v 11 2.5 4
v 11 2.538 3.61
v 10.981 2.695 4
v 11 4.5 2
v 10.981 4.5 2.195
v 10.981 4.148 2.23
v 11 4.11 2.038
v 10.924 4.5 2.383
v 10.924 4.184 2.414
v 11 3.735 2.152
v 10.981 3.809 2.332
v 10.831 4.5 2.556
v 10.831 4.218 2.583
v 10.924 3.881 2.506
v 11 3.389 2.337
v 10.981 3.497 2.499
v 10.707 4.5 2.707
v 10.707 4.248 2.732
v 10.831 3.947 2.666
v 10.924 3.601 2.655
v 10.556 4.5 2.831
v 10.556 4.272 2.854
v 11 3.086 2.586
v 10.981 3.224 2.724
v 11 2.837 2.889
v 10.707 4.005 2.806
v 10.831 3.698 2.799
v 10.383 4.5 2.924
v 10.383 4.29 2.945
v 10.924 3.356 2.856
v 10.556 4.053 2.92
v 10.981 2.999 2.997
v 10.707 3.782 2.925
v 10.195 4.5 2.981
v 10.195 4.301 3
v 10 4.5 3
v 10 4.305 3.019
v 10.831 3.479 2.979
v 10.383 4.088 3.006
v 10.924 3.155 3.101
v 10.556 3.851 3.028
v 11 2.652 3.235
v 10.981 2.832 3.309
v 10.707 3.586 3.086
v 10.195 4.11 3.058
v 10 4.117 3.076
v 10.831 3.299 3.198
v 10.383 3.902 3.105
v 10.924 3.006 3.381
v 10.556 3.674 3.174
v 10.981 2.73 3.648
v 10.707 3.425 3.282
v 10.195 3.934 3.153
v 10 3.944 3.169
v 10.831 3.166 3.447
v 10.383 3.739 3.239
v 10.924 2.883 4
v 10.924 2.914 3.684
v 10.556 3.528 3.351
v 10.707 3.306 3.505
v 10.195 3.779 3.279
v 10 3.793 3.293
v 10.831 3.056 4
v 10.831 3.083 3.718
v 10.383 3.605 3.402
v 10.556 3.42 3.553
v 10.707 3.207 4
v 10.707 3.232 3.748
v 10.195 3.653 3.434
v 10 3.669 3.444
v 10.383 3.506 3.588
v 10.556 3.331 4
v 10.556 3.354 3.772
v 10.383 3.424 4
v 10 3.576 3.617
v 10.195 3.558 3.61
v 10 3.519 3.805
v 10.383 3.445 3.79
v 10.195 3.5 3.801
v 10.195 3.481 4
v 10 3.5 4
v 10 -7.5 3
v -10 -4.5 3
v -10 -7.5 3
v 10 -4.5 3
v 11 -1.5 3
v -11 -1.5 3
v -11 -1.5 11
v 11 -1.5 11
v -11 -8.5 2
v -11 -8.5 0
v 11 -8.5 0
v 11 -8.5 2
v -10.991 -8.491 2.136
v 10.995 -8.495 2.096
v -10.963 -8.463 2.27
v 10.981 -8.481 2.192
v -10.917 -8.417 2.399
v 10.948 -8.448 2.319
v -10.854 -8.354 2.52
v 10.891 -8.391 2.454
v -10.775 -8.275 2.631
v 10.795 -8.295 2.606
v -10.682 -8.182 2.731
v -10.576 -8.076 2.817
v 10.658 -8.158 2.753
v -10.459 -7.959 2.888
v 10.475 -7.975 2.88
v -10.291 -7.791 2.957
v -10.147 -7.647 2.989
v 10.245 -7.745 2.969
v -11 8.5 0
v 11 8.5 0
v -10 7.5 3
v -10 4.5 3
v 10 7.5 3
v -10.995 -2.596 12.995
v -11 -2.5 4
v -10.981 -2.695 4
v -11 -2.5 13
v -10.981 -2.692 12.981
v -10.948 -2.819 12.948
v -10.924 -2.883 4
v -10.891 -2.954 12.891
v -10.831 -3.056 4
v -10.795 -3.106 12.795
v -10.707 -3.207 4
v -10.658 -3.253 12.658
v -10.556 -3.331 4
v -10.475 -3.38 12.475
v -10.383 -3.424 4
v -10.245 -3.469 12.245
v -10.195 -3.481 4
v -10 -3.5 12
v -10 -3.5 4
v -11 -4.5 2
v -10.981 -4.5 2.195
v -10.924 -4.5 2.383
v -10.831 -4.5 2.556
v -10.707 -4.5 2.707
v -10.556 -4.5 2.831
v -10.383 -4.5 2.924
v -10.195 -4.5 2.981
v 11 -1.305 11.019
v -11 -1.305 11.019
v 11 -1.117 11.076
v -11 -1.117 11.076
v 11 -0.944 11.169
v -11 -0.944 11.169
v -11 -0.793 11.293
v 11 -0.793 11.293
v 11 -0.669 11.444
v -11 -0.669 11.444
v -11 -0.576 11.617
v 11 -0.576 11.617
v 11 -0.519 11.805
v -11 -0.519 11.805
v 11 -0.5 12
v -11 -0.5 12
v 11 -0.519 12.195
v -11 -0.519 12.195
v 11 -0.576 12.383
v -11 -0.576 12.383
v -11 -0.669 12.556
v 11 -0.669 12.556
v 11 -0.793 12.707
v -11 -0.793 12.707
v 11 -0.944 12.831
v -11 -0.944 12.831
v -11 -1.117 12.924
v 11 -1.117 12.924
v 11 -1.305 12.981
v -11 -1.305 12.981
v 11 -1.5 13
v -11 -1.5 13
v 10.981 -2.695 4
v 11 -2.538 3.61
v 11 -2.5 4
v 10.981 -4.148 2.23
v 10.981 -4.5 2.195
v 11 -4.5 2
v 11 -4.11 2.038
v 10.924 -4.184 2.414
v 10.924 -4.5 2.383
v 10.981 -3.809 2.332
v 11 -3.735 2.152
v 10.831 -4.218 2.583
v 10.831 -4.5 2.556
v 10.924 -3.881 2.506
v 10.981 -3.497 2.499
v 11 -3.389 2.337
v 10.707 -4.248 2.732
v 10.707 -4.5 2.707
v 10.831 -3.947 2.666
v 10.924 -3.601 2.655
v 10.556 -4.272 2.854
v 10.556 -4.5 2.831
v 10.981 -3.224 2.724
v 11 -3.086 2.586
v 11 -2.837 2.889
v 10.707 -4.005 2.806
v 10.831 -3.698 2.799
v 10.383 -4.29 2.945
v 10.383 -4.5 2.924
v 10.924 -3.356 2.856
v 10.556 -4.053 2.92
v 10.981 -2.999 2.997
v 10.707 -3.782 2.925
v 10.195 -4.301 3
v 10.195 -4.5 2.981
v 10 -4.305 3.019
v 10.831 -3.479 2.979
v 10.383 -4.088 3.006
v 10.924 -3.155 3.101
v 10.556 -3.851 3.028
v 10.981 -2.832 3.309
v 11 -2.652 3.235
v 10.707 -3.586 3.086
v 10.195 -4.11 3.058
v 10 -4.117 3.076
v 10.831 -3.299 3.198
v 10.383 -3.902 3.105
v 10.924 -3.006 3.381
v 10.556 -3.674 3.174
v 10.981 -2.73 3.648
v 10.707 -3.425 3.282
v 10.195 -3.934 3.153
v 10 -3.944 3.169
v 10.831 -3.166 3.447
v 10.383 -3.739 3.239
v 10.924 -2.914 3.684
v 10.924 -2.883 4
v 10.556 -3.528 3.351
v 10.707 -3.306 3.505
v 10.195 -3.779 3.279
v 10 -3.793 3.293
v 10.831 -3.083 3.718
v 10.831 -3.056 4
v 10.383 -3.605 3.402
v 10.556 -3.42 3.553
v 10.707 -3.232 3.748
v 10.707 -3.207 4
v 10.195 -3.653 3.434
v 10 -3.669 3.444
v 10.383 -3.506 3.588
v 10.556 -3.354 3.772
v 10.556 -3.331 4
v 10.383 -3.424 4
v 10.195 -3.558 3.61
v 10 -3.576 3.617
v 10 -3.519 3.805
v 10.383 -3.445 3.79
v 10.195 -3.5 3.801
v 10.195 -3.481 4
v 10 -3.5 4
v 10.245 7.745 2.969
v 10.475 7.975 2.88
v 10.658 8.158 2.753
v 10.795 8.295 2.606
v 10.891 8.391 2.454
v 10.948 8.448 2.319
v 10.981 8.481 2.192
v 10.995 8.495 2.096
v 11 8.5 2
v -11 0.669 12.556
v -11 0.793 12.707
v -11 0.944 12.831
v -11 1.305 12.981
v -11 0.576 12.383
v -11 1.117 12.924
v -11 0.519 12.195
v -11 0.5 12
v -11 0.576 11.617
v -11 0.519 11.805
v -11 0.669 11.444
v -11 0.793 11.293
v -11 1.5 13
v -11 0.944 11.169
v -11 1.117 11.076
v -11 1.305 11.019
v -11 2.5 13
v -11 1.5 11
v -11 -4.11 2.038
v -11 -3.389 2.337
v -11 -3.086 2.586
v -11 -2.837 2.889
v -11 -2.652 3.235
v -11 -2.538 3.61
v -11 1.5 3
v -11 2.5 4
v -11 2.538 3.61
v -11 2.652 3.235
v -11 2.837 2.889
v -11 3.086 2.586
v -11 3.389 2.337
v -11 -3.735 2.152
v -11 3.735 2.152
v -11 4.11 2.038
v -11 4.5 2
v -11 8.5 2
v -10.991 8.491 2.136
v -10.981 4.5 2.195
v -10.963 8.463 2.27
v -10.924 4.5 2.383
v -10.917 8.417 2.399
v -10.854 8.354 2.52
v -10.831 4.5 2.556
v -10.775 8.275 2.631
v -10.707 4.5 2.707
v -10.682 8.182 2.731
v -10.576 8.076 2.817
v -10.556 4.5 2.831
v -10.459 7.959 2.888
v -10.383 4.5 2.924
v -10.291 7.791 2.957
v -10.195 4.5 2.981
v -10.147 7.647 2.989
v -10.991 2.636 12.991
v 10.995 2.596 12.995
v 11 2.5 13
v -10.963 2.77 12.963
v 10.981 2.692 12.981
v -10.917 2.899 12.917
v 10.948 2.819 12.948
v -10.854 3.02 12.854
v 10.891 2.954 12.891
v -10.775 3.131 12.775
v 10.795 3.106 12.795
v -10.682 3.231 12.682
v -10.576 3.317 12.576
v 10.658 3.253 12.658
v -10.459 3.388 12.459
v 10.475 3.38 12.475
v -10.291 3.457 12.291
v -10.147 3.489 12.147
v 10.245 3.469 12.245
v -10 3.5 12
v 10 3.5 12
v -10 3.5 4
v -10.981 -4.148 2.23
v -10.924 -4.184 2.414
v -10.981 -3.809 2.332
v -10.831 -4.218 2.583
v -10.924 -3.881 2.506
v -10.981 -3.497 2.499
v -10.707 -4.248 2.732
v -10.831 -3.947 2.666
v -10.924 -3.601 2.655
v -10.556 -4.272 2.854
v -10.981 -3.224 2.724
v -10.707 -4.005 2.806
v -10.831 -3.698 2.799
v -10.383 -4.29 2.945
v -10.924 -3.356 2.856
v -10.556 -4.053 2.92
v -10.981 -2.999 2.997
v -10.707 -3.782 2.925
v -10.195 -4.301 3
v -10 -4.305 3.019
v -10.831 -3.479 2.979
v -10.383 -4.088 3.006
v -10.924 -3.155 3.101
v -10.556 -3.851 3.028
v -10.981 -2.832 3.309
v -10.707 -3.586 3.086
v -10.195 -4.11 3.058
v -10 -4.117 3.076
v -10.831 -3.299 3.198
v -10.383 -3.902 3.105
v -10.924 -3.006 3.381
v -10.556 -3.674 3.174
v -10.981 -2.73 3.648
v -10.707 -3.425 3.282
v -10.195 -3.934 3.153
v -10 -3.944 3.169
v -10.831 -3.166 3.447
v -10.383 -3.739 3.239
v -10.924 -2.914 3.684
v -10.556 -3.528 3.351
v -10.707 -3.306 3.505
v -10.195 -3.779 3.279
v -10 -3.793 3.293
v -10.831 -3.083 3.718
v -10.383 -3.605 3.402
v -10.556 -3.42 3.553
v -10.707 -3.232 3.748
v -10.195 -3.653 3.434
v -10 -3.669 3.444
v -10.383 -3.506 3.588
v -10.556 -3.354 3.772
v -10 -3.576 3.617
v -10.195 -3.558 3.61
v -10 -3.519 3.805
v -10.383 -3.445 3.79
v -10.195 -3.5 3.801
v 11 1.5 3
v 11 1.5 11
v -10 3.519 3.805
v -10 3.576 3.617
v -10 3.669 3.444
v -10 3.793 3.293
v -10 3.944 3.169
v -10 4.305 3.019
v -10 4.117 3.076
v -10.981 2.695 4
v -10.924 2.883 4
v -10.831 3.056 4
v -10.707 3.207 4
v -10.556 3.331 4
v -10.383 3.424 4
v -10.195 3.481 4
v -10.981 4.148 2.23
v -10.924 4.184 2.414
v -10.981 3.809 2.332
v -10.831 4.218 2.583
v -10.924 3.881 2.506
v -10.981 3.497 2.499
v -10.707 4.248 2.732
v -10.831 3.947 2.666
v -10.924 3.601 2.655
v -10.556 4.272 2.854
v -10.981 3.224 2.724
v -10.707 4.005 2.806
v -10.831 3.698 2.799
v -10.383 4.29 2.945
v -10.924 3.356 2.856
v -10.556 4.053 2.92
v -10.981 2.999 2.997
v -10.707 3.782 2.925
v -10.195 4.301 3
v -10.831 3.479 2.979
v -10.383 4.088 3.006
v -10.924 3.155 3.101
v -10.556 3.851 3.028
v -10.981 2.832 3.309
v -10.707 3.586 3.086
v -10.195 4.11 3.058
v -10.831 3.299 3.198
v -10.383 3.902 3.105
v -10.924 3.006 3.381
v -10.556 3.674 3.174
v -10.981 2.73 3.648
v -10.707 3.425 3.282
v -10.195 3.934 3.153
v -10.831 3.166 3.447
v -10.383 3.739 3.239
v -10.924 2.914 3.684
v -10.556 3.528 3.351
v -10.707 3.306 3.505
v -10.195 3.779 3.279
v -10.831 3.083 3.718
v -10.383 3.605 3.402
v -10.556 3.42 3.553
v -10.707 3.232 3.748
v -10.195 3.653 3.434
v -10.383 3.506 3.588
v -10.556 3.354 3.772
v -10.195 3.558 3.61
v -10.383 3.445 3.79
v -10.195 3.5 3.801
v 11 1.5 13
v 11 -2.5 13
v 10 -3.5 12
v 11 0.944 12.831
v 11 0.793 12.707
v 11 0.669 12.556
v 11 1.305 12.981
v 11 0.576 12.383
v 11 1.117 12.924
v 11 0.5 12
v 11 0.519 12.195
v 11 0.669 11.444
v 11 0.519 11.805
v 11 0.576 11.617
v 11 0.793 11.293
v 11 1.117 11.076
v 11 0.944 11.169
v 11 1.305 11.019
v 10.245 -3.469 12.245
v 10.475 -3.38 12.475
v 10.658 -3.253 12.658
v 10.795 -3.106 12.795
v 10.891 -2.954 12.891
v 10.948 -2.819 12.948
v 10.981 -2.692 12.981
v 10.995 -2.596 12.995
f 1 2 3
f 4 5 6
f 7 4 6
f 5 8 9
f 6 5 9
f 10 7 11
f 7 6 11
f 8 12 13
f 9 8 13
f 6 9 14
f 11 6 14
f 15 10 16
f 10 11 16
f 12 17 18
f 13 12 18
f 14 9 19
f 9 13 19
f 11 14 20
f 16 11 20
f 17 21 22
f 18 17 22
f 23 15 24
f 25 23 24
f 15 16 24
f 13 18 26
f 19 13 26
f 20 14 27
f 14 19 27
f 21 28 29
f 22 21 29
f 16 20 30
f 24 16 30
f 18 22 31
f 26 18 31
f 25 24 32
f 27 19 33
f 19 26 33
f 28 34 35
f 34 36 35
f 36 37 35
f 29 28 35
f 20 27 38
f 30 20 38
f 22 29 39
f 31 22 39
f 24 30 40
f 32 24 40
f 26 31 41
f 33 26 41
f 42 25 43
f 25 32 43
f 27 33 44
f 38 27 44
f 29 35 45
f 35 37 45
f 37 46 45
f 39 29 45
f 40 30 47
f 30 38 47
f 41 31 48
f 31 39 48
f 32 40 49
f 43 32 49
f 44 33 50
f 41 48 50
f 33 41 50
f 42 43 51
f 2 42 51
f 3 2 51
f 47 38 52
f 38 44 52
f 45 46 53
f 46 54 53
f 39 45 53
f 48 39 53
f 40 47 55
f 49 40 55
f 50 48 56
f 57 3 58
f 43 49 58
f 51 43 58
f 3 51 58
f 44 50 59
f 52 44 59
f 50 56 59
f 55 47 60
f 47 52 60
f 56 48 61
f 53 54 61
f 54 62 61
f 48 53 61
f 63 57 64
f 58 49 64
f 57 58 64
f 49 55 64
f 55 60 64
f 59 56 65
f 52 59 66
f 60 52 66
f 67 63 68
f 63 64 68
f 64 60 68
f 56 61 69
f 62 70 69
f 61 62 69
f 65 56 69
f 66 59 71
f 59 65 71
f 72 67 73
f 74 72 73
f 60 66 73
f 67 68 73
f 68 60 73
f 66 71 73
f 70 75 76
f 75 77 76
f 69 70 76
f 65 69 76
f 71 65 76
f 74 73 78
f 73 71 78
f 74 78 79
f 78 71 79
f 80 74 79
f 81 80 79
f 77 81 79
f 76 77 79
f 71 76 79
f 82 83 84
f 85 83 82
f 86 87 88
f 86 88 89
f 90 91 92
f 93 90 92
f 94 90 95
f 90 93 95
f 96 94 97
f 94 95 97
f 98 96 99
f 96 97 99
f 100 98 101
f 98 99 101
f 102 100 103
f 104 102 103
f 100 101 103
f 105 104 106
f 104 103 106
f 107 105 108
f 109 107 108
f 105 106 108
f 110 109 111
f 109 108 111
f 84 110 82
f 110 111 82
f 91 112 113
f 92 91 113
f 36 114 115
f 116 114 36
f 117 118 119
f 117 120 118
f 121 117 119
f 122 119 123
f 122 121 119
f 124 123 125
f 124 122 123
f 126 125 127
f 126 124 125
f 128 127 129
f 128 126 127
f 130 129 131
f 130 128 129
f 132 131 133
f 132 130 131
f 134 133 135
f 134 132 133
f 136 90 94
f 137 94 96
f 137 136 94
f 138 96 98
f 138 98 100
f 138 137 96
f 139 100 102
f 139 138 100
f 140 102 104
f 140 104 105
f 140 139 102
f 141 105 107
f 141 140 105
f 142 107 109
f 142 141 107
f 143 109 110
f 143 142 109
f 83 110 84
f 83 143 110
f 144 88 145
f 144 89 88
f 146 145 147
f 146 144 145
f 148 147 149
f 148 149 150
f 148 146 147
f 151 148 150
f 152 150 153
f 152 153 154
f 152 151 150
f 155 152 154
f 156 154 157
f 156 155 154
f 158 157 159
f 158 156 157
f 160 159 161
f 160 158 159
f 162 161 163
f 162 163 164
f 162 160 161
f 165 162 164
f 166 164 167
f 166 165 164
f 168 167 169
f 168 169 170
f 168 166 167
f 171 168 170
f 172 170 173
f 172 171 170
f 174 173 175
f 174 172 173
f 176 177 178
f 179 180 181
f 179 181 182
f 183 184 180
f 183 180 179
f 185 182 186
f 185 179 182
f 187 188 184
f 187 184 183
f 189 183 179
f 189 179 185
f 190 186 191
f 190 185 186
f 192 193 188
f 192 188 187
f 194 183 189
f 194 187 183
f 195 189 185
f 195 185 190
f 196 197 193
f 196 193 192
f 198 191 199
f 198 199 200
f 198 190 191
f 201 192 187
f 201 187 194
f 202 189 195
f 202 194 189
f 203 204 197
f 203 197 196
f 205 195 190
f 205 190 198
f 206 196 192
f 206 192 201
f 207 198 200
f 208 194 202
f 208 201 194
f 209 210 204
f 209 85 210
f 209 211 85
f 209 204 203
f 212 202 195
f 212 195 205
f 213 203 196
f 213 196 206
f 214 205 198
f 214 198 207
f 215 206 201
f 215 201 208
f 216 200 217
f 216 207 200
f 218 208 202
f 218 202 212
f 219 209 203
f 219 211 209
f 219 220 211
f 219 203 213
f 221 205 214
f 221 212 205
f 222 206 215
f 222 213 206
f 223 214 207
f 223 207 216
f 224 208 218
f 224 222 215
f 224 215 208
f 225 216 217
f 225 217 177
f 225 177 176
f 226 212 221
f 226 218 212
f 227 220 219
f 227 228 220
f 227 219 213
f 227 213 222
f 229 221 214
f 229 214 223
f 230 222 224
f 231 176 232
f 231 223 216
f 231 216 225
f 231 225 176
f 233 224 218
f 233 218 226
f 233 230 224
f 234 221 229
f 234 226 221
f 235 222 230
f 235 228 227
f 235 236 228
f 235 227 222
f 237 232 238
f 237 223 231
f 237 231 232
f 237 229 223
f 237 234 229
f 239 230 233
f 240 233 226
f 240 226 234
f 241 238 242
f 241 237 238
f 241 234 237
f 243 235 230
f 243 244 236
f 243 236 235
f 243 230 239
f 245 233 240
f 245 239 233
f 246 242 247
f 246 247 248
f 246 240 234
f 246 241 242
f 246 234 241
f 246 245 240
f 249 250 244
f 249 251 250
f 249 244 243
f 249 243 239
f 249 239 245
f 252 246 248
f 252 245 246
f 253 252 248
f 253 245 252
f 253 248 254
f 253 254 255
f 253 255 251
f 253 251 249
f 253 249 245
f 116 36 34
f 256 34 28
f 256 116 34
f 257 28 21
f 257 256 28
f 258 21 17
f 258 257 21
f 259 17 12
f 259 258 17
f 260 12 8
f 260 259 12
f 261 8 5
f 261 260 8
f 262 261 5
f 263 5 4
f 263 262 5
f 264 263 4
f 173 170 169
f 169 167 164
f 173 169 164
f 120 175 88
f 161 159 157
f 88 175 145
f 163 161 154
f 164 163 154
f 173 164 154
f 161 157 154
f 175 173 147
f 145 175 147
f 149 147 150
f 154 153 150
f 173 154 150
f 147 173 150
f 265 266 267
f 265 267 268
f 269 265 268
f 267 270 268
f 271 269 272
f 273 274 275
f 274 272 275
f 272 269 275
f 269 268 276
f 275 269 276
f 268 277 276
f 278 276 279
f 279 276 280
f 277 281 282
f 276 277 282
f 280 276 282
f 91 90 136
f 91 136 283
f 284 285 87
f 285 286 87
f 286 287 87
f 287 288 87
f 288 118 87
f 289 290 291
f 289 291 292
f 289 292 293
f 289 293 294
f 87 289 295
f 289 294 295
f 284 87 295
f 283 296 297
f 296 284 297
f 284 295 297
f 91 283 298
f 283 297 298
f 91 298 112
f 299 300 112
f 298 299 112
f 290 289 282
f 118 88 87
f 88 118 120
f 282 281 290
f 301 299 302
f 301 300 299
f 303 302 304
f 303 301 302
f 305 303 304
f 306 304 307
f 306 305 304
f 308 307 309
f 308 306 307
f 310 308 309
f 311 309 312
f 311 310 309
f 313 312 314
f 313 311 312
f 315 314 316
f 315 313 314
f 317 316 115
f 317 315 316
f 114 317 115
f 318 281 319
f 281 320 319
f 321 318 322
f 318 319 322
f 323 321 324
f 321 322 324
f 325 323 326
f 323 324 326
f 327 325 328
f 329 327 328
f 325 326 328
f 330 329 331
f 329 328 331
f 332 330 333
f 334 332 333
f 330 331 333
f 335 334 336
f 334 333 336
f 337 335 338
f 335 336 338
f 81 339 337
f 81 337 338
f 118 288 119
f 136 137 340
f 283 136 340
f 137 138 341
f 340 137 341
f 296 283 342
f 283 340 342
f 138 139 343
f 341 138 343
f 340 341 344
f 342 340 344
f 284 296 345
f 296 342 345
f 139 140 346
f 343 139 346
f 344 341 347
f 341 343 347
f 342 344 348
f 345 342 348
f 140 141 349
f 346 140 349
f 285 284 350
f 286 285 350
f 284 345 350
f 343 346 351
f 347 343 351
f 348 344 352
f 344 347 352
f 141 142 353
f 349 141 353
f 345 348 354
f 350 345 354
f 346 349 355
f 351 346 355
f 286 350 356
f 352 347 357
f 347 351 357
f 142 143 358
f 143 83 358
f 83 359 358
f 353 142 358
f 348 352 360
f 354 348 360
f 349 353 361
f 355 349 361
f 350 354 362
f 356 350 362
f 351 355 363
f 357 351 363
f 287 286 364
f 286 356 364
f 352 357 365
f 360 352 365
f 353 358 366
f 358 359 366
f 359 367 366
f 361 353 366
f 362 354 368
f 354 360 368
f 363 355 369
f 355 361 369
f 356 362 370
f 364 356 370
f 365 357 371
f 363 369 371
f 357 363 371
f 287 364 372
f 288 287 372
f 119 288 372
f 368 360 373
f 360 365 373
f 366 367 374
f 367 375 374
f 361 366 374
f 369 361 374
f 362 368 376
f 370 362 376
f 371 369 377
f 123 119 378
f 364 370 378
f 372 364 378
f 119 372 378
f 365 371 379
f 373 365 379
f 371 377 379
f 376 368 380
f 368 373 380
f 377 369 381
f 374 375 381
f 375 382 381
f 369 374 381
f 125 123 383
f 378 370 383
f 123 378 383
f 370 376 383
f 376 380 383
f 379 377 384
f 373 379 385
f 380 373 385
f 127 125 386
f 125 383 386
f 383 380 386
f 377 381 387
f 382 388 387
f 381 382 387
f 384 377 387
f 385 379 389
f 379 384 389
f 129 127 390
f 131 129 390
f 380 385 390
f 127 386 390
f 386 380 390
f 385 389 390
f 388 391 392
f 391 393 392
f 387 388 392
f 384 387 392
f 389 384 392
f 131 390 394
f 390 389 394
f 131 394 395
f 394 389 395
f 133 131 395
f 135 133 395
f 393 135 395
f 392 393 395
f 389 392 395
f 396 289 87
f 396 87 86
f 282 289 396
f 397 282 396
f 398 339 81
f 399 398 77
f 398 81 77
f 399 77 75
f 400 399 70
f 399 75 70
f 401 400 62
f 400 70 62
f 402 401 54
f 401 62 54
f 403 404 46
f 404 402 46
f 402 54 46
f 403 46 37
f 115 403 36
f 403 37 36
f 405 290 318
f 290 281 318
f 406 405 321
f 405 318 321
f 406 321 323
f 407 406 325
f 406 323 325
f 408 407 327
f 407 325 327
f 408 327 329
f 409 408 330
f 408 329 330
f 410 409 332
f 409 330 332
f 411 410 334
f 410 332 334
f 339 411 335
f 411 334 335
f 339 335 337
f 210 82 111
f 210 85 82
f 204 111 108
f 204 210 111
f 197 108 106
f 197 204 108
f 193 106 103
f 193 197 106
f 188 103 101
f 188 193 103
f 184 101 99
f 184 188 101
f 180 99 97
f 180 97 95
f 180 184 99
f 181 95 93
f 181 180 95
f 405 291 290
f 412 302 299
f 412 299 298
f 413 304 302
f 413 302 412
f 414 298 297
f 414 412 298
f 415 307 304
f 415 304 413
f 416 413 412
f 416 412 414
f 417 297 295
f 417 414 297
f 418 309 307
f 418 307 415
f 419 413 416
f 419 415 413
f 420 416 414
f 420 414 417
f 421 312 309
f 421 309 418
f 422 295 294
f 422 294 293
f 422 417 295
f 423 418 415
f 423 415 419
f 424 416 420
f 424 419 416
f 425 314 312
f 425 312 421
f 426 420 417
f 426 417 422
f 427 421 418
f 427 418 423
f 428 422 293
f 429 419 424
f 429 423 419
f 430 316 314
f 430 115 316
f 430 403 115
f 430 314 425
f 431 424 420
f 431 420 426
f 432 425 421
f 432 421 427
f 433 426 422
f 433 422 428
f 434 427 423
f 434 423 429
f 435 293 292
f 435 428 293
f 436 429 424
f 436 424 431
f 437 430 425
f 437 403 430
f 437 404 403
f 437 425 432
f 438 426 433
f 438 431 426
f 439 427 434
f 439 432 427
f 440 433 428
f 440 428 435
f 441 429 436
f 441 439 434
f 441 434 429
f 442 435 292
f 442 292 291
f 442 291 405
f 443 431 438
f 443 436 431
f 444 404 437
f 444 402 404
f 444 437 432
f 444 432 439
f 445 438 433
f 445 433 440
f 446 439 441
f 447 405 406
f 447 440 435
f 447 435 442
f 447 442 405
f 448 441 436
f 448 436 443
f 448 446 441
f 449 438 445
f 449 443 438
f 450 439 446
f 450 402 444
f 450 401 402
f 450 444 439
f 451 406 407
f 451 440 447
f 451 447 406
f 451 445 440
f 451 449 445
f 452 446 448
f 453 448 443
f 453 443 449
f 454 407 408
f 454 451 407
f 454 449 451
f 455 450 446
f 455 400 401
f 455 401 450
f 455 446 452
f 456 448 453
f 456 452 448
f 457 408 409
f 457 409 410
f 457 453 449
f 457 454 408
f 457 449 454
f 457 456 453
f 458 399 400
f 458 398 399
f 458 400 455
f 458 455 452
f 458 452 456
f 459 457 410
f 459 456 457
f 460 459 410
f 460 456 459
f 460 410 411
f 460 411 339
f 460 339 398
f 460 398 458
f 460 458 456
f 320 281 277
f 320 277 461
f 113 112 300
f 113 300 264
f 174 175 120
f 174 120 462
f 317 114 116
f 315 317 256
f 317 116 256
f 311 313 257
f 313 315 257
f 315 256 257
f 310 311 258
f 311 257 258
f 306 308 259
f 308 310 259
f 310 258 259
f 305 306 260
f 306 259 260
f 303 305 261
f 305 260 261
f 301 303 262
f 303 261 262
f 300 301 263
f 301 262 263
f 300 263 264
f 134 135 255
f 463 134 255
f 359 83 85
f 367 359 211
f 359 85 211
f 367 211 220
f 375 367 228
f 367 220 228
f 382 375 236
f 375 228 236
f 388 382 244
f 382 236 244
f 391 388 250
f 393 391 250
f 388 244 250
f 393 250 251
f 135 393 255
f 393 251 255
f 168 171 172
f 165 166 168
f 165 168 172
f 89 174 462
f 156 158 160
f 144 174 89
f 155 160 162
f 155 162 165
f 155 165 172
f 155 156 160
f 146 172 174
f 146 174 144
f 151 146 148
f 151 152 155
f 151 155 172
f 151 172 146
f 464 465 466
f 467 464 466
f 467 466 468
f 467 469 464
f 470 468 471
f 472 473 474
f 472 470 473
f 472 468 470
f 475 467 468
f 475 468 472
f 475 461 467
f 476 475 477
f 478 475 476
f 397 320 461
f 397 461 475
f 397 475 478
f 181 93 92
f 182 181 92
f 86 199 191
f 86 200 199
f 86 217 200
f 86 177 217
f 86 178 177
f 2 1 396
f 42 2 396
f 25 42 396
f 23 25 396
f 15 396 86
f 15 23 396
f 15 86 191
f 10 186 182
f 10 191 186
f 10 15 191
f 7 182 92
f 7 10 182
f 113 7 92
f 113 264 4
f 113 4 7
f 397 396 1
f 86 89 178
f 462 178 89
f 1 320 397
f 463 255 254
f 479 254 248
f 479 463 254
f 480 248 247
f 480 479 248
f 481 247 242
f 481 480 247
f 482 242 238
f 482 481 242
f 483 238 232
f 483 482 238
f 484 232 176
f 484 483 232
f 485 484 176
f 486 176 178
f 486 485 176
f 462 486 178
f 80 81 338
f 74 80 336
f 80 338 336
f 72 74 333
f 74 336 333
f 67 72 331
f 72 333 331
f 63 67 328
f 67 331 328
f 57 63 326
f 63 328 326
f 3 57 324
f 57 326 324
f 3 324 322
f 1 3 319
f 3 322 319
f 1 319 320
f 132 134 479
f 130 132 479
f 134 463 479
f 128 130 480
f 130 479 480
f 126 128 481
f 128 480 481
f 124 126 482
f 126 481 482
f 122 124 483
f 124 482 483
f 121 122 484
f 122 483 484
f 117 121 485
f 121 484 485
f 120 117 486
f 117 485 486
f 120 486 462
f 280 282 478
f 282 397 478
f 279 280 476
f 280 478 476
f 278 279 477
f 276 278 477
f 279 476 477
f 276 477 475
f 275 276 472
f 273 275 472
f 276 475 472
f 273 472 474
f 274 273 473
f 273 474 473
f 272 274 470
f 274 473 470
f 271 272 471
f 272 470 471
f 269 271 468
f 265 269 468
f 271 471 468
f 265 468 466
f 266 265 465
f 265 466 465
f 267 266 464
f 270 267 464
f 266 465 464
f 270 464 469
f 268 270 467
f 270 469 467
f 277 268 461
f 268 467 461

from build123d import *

# Parameters (mm, degrees)
F0_W     = 22
F0_H     = 17
F1_DEPTH = 3
F2_W     = 22
F2_H     = 2
F3_DEPTH = 10
F4_W     = 22
F4_H     = 1
F7_R     = 1


with BuildPart() as f1:
    # F0 (on Top) → F1 (new body)
    with BuildSketch(Plane.XY):
        Rectangle(F0_W, F0_H)
    extrude(amount=F1_DEPTH)

    # F2 (on face) → F3 (join)
    with BuildSketch(Plane.XY.offset(3)):
        with Locations((0, 2.5)):
            Rectangle(F2_W, F2_H)
        with Locations((0, -2.5)):
            Rectangle(F2_W, F2_H)
    extrude(amount=F3_DEPTH)

    # F4 (on face) → F5 (revolve)
    with BuildSketch(Plane.XZ.offset(-1.5)):
        with Locations((0, 12.5)):
            Rectangle(F4_W, F4_H)
    revolve(axis=Axis((0, 1.5, 12), (-1, 0, 0)))

    # F6: F1 across plane


with BuildPart() as f1_1:
    add(f1.part)
    add(f1.part.mirror(Plane.XZ))

    # F7
    f7_edges = [f1_1.edges().sort_by_distance(p)[0] for p in [
        (0, -3.5, 3),
        (0, -3.5, 13),
        (11, 3.5, 8),
        (11, -6, 3),
        (0, -8.5, 3),
        (-11, -6, 3),
        (0, 3.5, 13),
        (0, 3.5, 3),
        (-11, 6, 3),
        (11, 6, 3),
        (0, 8.5, 3),
        (-11, 3.5, 8),
        (-11, -3.5, 8),
        (11, -3.5, 8),
    ]]
    fillet(f7_edges, radius=F7_R)


solid = f1_1.part
